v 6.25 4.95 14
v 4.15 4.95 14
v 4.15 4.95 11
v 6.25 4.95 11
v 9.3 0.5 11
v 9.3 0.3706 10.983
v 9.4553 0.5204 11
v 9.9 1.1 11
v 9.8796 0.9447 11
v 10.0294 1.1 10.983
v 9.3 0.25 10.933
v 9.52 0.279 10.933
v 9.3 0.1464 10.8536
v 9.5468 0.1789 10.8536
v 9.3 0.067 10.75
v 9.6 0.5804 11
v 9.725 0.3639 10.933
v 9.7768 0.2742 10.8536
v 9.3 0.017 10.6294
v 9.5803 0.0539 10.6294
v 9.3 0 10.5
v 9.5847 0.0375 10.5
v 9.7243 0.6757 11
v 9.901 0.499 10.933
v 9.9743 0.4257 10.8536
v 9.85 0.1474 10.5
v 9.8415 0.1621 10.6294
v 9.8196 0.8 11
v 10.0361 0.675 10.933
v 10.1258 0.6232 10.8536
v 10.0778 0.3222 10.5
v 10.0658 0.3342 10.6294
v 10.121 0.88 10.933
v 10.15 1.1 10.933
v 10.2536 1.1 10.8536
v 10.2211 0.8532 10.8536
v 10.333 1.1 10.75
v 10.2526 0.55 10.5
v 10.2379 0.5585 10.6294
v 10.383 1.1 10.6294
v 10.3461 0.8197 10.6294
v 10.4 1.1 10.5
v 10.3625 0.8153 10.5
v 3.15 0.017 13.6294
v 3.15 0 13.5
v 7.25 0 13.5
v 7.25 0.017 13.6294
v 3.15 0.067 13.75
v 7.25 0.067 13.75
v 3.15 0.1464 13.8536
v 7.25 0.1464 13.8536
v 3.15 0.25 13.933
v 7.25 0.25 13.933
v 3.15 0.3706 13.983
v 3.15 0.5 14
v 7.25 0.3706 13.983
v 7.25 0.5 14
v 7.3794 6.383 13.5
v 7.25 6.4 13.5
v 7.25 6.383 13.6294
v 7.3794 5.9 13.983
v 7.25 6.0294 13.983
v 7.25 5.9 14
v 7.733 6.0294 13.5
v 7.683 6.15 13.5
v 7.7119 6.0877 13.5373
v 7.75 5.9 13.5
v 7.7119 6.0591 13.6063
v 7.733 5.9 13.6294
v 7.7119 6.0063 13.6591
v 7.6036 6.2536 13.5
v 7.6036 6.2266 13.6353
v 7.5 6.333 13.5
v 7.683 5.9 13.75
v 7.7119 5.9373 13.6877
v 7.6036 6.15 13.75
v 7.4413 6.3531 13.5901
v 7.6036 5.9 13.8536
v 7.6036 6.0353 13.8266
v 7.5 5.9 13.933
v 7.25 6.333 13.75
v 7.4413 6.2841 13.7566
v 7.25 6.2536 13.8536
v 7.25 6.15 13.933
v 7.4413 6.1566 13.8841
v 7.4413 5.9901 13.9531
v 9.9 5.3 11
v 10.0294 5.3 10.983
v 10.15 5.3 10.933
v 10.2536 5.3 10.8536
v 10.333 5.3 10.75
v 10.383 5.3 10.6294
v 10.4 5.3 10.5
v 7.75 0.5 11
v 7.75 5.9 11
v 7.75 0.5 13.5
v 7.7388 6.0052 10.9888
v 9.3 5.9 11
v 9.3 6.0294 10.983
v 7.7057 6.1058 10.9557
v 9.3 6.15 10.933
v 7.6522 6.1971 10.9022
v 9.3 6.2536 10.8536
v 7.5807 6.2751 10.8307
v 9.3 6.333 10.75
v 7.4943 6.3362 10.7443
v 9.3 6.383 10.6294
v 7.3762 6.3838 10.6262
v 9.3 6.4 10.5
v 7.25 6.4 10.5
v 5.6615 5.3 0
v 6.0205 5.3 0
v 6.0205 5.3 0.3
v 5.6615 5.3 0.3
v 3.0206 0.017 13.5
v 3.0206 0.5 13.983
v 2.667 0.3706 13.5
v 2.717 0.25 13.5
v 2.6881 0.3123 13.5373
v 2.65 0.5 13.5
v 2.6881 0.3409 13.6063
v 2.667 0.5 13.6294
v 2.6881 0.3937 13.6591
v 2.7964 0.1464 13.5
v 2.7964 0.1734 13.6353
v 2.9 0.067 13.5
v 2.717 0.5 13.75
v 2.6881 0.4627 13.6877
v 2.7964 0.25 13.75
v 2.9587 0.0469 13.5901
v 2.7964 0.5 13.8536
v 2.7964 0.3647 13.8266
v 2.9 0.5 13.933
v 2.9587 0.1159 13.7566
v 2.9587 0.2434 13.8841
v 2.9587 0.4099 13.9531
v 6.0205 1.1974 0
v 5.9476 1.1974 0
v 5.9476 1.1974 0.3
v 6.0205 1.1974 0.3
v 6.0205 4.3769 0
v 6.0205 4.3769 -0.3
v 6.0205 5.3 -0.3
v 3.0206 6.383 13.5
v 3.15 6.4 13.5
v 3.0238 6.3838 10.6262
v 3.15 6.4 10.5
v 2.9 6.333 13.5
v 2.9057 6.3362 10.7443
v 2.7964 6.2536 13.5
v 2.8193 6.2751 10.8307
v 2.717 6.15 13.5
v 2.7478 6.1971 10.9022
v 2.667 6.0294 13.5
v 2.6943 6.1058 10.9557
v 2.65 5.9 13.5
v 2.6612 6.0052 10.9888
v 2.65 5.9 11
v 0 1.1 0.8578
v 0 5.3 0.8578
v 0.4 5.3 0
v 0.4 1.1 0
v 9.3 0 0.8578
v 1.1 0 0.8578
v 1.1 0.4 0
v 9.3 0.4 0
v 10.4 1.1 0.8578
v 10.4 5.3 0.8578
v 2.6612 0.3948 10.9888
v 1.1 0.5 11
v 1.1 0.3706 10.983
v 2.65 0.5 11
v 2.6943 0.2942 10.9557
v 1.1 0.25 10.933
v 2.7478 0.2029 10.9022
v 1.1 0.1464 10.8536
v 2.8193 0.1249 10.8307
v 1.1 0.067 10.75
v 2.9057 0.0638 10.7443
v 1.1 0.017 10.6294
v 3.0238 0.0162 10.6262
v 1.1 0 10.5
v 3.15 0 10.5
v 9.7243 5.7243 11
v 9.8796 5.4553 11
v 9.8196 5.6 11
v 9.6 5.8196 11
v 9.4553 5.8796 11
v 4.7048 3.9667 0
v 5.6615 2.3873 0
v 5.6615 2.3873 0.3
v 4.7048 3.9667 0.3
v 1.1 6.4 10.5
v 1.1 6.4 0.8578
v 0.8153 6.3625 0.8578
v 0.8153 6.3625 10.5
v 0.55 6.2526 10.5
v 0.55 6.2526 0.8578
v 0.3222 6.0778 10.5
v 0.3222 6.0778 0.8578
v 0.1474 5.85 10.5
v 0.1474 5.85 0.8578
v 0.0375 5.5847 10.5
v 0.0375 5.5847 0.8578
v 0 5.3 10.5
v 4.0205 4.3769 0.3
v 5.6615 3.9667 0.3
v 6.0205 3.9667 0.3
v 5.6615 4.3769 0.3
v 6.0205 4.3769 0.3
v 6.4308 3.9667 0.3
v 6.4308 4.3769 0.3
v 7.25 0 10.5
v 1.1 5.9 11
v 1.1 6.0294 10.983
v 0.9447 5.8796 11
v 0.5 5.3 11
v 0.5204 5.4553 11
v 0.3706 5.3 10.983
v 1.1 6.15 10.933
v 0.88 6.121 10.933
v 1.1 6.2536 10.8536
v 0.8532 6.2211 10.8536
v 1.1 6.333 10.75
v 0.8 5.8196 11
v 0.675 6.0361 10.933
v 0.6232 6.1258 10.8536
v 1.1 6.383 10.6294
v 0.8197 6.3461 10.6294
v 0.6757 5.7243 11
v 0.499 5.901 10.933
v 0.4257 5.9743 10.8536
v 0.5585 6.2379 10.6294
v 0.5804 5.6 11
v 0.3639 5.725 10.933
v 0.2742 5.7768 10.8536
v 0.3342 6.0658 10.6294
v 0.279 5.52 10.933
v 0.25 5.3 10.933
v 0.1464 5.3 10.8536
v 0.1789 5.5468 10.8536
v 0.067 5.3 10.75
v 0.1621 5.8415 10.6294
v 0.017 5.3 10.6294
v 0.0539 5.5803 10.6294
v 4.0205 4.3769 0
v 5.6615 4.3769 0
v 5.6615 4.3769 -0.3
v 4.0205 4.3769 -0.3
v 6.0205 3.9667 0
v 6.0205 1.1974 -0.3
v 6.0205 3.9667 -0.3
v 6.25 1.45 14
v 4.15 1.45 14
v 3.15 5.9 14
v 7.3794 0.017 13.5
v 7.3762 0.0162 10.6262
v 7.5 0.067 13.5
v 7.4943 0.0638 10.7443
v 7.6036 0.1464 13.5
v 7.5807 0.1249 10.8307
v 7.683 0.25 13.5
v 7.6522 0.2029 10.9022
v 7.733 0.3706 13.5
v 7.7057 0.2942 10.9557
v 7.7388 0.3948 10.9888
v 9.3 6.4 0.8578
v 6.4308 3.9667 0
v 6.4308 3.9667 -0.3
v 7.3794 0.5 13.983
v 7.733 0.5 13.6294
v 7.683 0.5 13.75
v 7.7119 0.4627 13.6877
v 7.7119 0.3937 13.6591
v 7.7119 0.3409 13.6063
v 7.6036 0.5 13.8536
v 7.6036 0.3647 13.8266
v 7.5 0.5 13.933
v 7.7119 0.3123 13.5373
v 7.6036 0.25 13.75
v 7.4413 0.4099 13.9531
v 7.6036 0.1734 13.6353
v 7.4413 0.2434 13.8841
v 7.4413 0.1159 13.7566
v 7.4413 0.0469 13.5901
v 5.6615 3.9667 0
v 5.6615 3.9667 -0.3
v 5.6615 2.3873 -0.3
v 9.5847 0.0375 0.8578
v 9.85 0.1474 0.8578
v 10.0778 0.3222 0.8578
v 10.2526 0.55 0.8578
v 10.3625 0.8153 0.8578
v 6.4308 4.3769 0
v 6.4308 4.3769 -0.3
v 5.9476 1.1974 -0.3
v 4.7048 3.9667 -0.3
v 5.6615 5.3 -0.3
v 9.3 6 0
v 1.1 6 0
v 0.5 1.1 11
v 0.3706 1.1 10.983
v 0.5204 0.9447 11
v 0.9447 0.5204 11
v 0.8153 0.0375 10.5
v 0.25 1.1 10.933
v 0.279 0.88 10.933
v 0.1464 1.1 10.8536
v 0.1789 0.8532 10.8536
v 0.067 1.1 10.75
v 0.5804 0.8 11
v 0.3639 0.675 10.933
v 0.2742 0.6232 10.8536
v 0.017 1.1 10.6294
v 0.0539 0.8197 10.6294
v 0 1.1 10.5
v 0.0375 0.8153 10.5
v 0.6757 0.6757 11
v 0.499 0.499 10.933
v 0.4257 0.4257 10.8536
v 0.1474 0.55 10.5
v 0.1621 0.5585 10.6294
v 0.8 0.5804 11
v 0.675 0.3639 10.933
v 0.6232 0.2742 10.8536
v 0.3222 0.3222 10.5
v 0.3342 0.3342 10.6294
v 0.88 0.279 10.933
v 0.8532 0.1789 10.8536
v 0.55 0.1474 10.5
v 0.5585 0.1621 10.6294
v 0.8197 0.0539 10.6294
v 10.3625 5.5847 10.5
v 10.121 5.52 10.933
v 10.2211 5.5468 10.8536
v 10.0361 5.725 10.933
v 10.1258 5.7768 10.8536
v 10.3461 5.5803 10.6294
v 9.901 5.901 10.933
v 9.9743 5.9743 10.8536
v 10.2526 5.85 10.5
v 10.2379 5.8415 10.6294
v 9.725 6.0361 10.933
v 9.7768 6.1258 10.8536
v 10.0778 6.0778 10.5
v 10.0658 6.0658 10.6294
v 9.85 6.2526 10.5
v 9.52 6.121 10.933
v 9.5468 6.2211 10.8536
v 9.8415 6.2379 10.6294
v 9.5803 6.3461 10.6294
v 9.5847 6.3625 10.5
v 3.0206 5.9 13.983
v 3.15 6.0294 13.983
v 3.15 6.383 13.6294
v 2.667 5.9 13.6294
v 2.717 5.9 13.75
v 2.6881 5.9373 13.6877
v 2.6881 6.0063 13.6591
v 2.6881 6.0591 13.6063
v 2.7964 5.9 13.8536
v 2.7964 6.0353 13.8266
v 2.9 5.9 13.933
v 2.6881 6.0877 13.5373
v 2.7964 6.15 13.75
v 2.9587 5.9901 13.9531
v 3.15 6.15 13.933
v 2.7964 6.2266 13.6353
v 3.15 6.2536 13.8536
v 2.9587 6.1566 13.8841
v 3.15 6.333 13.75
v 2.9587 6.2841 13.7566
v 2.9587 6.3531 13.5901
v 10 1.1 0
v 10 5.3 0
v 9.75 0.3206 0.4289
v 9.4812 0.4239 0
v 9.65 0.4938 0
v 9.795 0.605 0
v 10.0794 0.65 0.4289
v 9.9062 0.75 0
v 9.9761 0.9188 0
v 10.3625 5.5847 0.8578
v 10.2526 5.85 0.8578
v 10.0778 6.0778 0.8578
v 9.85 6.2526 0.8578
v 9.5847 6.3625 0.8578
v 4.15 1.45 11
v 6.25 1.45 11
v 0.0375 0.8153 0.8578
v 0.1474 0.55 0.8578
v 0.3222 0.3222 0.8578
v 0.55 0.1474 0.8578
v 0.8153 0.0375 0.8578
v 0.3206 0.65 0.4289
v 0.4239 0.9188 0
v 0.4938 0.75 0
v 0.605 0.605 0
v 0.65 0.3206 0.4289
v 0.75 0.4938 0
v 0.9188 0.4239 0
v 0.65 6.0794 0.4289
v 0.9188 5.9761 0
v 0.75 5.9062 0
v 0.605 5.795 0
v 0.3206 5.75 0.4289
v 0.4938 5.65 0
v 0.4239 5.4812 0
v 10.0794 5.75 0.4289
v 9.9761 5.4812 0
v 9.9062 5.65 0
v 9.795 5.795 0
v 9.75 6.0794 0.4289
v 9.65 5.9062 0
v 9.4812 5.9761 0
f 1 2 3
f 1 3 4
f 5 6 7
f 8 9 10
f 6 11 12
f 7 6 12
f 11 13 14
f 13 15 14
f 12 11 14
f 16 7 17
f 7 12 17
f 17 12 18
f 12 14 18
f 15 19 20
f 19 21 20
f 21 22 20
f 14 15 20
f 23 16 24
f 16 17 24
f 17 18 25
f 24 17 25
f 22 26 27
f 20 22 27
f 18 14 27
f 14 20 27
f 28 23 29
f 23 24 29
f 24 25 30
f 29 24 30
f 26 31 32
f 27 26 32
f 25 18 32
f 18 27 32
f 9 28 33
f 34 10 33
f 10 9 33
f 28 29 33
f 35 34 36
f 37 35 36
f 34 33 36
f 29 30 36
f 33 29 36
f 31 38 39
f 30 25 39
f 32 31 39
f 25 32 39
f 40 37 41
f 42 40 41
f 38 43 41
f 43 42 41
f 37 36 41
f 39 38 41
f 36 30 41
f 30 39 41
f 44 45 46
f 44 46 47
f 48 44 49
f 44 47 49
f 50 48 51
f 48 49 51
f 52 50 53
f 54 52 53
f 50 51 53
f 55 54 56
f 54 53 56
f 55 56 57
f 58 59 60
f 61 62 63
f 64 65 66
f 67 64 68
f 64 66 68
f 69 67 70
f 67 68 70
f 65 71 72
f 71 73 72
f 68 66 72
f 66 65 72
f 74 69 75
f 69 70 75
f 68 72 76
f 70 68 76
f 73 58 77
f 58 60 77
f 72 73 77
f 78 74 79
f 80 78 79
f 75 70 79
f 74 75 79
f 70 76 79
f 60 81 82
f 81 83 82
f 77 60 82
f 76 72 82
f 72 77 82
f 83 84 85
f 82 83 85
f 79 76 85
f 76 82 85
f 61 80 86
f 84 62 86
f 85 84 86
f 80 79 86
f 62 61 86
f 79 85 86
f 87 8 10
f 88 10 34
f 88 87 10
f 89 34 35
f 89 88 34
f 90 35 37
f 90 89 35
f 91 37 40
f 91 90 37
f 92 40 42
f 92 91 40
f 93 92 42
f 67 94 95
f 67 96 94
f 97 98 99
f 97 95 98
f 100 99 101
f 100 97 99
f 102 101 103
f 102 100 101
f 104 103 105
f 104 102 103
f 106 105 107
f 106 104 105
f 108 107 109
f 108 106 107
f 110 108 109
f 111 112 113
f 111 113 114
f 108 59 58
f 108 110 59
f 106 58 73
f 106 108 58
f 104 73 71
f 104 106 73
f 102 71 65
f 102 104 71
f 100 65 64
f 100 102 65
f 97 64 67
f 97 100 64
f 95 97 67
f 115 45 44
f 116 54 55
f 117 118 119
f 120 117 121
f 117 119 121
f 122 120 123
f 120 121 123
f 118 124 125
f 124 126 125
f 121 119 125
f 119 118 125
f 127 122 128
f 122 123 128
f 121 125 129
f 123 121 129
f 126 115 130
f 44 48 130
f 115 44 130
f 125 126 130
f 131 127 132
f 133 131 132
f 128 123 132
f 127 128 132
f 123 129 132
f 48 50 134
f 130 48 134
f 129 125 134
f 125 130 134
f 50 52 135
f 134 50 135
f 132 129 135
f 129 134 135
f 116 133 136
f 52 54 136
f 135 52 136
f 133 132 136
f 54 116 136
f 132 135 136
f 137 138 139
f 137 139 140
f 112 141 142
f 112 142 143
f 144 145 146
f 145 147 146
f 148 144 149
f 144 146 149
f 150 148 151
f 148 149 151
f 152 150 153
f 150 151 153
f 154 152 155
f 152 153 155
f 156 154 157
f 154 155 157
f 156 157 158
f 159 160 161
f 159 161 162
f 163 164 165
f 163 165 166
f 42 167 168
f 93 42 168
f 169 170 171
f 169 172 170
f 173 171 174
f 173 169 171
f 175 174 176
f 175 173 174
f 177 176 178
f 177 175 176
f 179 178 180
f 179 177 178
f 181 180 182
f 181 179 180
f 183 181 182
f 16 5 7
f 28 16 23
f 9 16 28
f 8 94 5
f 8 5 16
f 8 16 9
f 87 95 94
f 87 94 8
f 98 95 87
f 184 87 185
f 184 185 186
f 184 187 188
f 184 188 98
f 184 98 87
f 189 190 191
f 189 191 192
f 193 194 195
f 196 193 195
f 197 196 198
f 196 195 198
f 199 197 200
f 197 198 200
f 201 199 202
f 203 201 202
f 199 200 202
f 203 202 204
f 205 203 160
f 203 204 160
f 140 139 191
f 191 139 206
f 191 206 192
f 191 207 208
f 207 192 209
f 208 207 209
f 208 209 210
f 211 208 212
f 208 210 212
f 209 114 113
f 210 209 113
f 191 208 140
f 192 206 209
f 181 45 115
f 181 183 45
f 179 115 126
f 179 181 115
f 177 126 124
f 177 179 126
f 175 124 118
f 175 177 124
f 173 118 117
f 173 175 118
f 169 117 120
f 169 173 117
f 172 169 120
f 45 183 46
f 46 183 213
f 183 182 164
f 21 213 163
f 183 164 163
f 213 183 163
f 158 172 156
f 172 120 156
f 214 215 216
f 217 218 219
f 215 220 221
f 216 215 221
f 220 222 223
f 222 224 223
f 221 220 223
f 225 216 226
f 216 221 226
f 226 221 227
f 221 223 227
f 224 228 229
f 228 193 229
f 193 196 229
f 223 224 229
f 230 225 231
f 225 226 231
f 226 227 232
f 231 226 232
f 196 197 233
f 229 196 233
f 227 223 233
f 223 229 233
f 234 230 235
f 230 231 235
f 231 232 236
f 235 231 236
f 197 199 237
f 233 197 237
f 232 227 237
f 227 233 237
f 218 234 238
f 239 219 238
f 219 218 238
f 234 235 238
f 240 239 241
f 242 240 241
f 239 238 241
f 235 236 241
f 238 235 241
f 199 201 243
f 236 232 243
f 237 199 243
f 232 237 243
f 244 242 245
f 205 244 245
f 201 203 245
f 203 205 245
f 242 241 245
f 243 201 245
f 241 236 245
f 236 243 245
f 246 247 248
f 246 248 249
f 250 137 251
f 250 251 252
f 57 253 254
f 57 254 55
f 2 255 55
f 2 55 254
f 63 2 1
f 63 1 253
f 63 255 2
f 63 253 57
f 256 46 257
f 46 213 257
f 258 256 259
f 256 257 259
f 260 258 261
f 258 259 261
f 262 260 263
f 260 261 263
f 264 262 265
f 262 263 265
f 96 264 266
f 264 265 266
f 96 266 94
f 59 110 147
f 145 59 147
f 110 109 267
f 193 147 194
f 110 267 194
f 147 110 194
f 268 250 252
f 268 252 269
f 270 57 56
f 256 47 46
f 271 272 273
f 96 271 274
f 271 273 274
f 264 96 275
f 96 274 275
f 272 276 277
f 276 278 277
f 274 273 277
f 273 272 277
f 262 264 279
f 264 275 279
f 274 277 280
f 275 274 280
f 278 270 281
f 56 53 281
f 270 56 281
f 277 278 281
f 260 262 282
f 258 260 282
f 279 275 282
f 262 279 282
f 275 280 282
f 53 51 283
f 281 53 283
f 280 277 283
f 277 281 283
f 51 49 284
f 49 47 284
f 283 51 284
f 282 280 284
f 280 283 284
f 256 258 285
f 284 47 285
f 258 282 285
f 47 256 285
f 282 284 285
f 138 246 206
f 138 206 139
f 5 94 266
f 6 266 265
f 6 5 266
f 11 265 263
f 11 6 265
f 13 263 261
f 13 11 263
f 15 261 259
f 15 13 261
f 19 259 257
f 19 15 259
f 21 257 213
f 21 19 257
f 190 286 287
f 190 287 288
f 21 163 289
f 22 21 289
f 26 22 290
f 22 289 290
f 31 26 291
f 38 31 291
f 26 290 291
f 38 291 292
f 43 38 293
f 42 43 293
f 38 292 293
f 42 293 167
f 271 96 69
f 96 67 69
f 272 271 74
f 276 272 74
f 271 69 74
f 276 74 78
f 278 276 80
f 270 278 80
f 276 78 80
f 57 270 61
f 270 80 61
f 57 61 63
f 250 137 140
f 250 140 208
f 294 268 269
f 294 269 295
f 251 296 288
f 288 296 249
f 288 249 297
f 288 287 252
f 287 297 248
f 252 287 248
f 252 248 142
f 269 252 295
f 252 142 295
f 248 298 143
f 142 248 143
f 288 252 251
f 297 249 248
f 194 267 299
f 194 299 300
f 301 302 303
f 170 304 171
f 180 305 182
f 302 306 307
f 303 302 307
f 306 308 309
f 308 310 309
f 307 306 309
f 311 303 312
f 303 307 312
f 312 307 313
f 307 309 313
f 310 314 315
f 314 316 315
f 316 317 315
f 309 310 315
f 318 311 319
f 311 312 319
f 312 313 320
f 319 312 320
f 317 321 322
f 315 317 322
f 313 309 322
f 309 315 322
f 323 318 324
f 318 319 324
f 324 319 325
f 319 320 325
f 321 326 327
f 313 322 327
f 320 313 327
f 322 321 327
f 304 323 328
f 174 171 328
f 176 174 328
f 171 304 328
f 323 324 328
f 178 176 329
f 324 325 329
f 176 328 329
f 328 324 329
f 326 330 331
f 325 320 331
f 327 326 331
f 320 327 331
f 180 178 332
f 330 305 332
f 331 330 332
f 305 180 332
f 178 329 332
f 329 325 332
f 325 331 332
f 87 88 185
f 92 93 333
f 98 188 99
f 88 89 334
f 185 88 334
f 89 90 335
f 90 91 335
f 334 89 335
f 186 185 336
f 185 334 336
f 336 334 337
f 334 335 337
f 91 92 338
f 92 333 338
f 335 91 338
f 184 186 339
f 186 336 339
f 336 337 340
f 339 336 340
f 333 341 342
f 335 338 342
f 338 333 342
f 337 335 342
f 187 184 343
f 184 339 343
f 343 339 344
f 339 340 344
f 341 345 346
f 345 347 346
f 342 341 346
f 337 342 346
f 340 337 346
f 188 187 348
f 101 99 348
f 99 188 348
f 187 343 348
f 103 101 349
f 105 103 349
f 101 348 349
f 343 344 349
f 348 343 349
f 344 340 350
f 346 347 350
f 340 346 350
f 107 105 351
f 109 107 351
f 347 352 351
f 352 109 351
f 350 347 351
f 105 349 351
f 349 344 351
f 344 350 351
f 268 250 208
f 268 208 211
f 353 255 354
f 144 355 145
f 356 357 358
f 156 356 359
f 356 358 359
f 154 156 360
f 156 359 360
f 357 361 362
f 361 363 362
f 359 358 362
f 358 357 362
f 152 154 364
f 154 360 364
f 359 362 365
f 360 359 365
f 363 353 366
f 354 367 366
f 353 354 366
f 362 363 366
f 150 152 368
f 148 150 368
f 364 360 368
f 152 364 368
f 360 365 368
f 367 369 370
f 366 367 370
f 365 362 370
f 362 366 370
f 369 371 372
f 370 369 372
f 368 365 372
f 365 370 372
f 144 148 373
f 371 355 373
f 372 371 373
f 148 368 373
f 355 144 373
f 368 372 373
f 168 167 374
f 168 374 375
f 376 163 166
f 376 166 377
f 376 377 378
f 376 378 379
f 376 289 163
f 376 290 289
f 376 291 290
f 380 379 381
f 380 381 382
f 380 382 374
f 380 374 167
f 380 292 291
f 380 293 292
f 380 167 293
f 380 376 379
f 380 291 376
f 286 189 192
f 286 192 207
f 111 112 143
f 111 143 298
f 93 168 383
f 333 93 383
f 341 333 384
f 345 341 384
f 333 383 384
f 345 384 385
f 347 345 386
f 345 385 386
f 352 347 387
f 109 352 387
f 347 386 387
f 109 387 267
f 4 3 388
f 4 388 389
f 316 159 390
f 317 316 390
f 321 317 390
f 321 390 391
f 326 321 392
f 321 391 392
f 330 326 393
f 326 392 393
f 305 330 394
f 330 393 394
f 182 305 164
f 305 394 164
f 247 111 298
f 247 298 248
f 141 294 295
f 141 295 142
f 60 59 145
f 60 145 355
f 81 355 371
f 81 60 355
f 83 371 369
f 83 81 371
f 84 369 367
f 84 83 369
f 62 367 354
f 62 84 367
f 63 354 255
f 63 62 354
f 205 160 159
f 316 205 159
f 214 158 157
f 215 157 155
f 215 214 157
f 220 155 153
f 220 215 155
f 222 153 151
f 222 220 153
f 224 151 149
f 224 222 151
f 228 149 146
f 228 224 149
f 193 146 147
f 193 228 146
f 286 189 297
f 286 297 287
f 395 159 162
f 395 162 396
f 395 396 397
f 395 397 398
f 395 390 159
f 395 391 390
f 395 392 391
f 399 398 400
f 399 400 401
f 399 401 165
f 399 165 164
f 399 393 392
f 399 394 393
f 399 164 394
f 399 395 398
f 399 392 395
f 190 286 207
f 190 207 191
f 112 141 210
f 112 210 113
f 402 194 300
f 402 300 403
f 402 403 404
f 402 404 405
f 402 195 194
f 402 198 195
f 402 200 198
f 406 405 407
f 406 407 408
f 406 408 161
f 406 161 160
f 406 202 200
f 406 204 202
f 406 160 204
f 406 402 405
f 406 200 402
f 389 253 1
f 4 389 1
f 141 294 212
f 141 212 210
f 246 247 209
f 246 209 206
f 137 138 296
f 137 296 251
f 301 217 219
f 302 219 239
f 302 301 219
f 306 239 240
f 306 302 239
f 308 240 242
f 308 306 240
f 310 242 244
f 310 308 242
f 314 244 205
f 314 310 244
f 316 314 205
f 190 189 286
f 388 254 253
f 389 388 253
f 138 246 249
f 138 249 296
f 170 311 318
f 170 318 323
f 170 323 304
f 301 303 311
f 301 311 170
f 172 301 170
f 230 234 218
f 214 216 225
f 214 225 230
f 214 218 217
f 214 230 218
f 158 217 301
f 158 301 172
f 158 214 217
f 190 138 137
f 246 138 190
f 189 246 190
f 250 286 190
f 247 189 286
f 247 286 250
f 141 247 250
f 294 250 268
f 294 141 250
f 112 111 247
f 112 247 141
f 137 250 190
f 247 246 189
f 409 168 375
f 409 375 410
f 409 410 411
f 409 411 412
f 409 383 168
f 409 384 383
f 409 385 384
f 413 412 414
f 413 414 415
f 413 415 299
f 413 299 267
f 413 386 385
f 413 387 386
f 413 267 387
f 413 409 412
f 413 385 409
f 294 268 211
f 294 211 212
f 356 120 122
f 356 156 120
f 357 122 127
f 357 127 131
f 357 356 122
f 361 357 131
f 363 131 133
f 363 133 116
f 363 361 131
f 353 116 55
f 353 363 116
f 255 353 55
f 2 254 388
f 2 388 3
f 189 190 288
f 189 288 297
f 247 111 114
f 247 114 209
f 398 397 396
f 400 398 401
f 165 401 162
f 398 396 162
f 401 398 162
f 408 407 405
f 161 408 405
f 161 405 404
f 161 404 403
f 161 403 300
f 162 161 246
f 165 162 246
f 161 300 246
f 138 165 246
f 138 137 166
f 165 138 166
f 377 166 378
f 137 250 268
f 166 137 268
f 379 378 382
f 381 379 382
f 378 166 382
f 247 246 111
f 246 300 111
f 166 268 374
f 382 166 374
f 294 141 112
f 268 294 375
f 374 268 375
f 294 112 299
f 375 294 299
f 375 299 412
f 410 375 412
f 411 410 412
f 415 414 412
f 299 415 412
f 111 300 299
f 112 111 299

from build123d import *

# Parameters (mm, degrees)
BOSS_EXTRU_1_DEPTH      = 14
ESQUISSE3_W             = 2.1
ESQUISSE3_H             = 3.5
ENL_V_MAT_EXTRU_1_DEPTH = 3
ESQUISSE4_OUTSIDE_W     = 16.116
ESQUISSE4_OUTSIDE_H     = 12.116
ESQUISSE4_OUTSIDE_W_2   = 5.1
ESQUISSE4_OUTSIDE_H_2   = 6.4
ENL_V_MAT_EXTRU_2_DEPTH = 3
CONG_1_R                = 0.5
CHANFREIN1_SIZE         = 0.4
CHANFREIN1_SIZE2        = 0.857802768
ENL_V_MAT_EXTRU_3_DEPTH = 0.3
BOSS_EXTRU_2_DEPTH      = 0.3


with BuildPart() as part:
    # Esquisse2 → Boss.-Extru.1 (new body)
    with BuildSketch(Plane.XY):
        with BuildLine():
            Line((1.1, 0), (9.3, 0))
            ThreePointArc((9.3, 0), (10.077817459, 0.322182541), (10.4, 1.1))
            Line((10.4, 1.1), (10.4, 5.3))
            ThreePointArc((10.4, 5.3), (10.077817459, 6.077817459), (9.3, 6.4))
            Line((9.3, 6.4), (1.1, 6.4))
            ThreePointArc((1.1, 6.4), (0.322182541, 6.077817459), (0, 5.3))
            Line((0, 5.3), (0, 1.1))
            ThreePointArc((0, 1.1), (0.322182541, 0.322182541), (1.1, 0))
        make_face()
    extrude(amount=BOSS_EXTRU_1_DEPTH)

    # Esquisse3 → Enlèv. mat.-Extru.1 (cut)
    with BuildSketch(Plane.XY.offset(14)):
        with Locations((5.2, 3.2)):
            Rectangle(ESQUISSE3_W, ESQUISSE3_H)
    extrude(amount=-ENL_V_MAT_EXTRU_1_DEPTH, mode=Mode.SUBTRACT)

    # Esquisse4 outside → Enlèv. mat.-Extru.2 (cut)
    with BuildSketch(Plane.XY.offset(14)):
        with Locations((5.2, 3.2)):
            Rectangle(ESQUISSE4_OUTSIDE_W, ESQUISSE4_OUTSIDE_H)
        with Locations((5.2, 3.2)):
            Rectangle(ESQUISSE4_OUTSIDE_W_2, ESQUISSE4_OUTSIDE_H_2, mode=Mode.SUBTRACT)
    extrude(amount=-ENL_V_MAT_EXTRU_2_DEPTH, mode=Mode.SUBTRACT)

    # Congé1
    cong_1_edges = [part.edges().sort_by_distance(p)[0] for p in [
        (5.2, 6.4, 14),
        (5.2, 0, 14),
        (10.4, 3.2, 11),
        (1.875, 6.4, 11),
        (0.322182541, 6.077817459, 11),
        (0, 3.2, 11),
        (0.322182541, 0.322182541, 11),
        (1.875, 0, 11),
        (8.525, 0, 11),
        (10.077817459, 0.322182541, 11),
        (10.077817459, 6.077817459, 11),
        (8.525, 6.4, 11),
        (7.75, 6.4, 12.5),
        (7.75, 3.2, 14),
        (7.75, 0, 12.5),
        (2.65, 0, 12.5),
        (2.65, 3.2, 14),
        (2.65, 6.4, 12.5),
    ]]
    fillet(cong_1_edges, radius=CONG_1_R)

    # Chanfrein1
    chanfrein1_edges = [part.edges().sort_by_distance(p)[0] for p in [
        (5.2, 6.4, 0),
        (10.077817459, 6.077817459, 0),
        (10.4, 3.2, 0),
        (10.077817459, 0.322182541, 0),
        (5.2, 0, 0),
        (0.322182541, 0.322182541, 0),
        (0, 3.2, 0),
        (0.322182541, 6.077817459, 0),
    ]]
    chanfrein1_side = [part.faces().sort_by_distance(p)[0] for p in [
        (5.2, 3.2, 0),
    ]]
    chamfer(chanfrein1_edges, length=CHANFREIN1_SIZE, length2=CHANFREIN1_SIZE2, reference=chanfrein1_side[0])

    # Esquisse5 → Enlèv. mat.-Extru.3 (cut)
    with BuildSketch(Plane(origin=(0, 0, 0), x_dir=(-1, 0, 0), z_dir=(0, 0, -1))):
        Polygon((-5.947596154, 1.197435897), (-6.020512821, 1.197435897), (-6.020512821, 3.966666667), (-6.430769231, 3.966666667), (-6.430769231, 4.376923077), (-6.020512821, 4.376923077), (-6.020512821, 5.3), (-5.661538462, 5.3), (-5.661538462, 4.376923077), (-4.020512821, 4.376923077), align=None)
        Polygon((-5.661538462, 3.966666667), (-5.661538462, 2.387339744), (-4.704807692, 3.966666667), align=None, mode=Mode.SUBTRACT)
    extrude(amount=-ENL_V_MAT_EXTRU_3_DEPTH, mode=Mode.SUBTRACT)


with BuildPart() as body_2:
    # Esquisse5<2> → Boss.-Extru.2 (new body)
    with BuildSketch(Plane(origin=(0, 0, 0), x_dir=(-1, 0, 0), z_dir=(0, 0, -1))):
        Polygon((-5.947596154, 1.197435897), (-6.020512821, 1.197435897), (-6.020512821, 3.966666667), (-6.430769231, 3.966666667), (-6.430769231, 4.376923077), (-6.020512821, 4.376923077), (-6.020512821, 5.3), (-5.661538462, 5.3), (-5.661538462, 4.376923077), (-4.020512821, 4.376923077), align=None)
        Polygon((-5.661538462, 3.966666667), (-5.661538462, 2.387339744), (-4.704807692, 3.966666667), align=None, mode=Mode.SUBTRACT)
    extrude(amount=BOSS_EXTRU_2_DEPTH)


solid = Compound([part.part, body_2.part])
